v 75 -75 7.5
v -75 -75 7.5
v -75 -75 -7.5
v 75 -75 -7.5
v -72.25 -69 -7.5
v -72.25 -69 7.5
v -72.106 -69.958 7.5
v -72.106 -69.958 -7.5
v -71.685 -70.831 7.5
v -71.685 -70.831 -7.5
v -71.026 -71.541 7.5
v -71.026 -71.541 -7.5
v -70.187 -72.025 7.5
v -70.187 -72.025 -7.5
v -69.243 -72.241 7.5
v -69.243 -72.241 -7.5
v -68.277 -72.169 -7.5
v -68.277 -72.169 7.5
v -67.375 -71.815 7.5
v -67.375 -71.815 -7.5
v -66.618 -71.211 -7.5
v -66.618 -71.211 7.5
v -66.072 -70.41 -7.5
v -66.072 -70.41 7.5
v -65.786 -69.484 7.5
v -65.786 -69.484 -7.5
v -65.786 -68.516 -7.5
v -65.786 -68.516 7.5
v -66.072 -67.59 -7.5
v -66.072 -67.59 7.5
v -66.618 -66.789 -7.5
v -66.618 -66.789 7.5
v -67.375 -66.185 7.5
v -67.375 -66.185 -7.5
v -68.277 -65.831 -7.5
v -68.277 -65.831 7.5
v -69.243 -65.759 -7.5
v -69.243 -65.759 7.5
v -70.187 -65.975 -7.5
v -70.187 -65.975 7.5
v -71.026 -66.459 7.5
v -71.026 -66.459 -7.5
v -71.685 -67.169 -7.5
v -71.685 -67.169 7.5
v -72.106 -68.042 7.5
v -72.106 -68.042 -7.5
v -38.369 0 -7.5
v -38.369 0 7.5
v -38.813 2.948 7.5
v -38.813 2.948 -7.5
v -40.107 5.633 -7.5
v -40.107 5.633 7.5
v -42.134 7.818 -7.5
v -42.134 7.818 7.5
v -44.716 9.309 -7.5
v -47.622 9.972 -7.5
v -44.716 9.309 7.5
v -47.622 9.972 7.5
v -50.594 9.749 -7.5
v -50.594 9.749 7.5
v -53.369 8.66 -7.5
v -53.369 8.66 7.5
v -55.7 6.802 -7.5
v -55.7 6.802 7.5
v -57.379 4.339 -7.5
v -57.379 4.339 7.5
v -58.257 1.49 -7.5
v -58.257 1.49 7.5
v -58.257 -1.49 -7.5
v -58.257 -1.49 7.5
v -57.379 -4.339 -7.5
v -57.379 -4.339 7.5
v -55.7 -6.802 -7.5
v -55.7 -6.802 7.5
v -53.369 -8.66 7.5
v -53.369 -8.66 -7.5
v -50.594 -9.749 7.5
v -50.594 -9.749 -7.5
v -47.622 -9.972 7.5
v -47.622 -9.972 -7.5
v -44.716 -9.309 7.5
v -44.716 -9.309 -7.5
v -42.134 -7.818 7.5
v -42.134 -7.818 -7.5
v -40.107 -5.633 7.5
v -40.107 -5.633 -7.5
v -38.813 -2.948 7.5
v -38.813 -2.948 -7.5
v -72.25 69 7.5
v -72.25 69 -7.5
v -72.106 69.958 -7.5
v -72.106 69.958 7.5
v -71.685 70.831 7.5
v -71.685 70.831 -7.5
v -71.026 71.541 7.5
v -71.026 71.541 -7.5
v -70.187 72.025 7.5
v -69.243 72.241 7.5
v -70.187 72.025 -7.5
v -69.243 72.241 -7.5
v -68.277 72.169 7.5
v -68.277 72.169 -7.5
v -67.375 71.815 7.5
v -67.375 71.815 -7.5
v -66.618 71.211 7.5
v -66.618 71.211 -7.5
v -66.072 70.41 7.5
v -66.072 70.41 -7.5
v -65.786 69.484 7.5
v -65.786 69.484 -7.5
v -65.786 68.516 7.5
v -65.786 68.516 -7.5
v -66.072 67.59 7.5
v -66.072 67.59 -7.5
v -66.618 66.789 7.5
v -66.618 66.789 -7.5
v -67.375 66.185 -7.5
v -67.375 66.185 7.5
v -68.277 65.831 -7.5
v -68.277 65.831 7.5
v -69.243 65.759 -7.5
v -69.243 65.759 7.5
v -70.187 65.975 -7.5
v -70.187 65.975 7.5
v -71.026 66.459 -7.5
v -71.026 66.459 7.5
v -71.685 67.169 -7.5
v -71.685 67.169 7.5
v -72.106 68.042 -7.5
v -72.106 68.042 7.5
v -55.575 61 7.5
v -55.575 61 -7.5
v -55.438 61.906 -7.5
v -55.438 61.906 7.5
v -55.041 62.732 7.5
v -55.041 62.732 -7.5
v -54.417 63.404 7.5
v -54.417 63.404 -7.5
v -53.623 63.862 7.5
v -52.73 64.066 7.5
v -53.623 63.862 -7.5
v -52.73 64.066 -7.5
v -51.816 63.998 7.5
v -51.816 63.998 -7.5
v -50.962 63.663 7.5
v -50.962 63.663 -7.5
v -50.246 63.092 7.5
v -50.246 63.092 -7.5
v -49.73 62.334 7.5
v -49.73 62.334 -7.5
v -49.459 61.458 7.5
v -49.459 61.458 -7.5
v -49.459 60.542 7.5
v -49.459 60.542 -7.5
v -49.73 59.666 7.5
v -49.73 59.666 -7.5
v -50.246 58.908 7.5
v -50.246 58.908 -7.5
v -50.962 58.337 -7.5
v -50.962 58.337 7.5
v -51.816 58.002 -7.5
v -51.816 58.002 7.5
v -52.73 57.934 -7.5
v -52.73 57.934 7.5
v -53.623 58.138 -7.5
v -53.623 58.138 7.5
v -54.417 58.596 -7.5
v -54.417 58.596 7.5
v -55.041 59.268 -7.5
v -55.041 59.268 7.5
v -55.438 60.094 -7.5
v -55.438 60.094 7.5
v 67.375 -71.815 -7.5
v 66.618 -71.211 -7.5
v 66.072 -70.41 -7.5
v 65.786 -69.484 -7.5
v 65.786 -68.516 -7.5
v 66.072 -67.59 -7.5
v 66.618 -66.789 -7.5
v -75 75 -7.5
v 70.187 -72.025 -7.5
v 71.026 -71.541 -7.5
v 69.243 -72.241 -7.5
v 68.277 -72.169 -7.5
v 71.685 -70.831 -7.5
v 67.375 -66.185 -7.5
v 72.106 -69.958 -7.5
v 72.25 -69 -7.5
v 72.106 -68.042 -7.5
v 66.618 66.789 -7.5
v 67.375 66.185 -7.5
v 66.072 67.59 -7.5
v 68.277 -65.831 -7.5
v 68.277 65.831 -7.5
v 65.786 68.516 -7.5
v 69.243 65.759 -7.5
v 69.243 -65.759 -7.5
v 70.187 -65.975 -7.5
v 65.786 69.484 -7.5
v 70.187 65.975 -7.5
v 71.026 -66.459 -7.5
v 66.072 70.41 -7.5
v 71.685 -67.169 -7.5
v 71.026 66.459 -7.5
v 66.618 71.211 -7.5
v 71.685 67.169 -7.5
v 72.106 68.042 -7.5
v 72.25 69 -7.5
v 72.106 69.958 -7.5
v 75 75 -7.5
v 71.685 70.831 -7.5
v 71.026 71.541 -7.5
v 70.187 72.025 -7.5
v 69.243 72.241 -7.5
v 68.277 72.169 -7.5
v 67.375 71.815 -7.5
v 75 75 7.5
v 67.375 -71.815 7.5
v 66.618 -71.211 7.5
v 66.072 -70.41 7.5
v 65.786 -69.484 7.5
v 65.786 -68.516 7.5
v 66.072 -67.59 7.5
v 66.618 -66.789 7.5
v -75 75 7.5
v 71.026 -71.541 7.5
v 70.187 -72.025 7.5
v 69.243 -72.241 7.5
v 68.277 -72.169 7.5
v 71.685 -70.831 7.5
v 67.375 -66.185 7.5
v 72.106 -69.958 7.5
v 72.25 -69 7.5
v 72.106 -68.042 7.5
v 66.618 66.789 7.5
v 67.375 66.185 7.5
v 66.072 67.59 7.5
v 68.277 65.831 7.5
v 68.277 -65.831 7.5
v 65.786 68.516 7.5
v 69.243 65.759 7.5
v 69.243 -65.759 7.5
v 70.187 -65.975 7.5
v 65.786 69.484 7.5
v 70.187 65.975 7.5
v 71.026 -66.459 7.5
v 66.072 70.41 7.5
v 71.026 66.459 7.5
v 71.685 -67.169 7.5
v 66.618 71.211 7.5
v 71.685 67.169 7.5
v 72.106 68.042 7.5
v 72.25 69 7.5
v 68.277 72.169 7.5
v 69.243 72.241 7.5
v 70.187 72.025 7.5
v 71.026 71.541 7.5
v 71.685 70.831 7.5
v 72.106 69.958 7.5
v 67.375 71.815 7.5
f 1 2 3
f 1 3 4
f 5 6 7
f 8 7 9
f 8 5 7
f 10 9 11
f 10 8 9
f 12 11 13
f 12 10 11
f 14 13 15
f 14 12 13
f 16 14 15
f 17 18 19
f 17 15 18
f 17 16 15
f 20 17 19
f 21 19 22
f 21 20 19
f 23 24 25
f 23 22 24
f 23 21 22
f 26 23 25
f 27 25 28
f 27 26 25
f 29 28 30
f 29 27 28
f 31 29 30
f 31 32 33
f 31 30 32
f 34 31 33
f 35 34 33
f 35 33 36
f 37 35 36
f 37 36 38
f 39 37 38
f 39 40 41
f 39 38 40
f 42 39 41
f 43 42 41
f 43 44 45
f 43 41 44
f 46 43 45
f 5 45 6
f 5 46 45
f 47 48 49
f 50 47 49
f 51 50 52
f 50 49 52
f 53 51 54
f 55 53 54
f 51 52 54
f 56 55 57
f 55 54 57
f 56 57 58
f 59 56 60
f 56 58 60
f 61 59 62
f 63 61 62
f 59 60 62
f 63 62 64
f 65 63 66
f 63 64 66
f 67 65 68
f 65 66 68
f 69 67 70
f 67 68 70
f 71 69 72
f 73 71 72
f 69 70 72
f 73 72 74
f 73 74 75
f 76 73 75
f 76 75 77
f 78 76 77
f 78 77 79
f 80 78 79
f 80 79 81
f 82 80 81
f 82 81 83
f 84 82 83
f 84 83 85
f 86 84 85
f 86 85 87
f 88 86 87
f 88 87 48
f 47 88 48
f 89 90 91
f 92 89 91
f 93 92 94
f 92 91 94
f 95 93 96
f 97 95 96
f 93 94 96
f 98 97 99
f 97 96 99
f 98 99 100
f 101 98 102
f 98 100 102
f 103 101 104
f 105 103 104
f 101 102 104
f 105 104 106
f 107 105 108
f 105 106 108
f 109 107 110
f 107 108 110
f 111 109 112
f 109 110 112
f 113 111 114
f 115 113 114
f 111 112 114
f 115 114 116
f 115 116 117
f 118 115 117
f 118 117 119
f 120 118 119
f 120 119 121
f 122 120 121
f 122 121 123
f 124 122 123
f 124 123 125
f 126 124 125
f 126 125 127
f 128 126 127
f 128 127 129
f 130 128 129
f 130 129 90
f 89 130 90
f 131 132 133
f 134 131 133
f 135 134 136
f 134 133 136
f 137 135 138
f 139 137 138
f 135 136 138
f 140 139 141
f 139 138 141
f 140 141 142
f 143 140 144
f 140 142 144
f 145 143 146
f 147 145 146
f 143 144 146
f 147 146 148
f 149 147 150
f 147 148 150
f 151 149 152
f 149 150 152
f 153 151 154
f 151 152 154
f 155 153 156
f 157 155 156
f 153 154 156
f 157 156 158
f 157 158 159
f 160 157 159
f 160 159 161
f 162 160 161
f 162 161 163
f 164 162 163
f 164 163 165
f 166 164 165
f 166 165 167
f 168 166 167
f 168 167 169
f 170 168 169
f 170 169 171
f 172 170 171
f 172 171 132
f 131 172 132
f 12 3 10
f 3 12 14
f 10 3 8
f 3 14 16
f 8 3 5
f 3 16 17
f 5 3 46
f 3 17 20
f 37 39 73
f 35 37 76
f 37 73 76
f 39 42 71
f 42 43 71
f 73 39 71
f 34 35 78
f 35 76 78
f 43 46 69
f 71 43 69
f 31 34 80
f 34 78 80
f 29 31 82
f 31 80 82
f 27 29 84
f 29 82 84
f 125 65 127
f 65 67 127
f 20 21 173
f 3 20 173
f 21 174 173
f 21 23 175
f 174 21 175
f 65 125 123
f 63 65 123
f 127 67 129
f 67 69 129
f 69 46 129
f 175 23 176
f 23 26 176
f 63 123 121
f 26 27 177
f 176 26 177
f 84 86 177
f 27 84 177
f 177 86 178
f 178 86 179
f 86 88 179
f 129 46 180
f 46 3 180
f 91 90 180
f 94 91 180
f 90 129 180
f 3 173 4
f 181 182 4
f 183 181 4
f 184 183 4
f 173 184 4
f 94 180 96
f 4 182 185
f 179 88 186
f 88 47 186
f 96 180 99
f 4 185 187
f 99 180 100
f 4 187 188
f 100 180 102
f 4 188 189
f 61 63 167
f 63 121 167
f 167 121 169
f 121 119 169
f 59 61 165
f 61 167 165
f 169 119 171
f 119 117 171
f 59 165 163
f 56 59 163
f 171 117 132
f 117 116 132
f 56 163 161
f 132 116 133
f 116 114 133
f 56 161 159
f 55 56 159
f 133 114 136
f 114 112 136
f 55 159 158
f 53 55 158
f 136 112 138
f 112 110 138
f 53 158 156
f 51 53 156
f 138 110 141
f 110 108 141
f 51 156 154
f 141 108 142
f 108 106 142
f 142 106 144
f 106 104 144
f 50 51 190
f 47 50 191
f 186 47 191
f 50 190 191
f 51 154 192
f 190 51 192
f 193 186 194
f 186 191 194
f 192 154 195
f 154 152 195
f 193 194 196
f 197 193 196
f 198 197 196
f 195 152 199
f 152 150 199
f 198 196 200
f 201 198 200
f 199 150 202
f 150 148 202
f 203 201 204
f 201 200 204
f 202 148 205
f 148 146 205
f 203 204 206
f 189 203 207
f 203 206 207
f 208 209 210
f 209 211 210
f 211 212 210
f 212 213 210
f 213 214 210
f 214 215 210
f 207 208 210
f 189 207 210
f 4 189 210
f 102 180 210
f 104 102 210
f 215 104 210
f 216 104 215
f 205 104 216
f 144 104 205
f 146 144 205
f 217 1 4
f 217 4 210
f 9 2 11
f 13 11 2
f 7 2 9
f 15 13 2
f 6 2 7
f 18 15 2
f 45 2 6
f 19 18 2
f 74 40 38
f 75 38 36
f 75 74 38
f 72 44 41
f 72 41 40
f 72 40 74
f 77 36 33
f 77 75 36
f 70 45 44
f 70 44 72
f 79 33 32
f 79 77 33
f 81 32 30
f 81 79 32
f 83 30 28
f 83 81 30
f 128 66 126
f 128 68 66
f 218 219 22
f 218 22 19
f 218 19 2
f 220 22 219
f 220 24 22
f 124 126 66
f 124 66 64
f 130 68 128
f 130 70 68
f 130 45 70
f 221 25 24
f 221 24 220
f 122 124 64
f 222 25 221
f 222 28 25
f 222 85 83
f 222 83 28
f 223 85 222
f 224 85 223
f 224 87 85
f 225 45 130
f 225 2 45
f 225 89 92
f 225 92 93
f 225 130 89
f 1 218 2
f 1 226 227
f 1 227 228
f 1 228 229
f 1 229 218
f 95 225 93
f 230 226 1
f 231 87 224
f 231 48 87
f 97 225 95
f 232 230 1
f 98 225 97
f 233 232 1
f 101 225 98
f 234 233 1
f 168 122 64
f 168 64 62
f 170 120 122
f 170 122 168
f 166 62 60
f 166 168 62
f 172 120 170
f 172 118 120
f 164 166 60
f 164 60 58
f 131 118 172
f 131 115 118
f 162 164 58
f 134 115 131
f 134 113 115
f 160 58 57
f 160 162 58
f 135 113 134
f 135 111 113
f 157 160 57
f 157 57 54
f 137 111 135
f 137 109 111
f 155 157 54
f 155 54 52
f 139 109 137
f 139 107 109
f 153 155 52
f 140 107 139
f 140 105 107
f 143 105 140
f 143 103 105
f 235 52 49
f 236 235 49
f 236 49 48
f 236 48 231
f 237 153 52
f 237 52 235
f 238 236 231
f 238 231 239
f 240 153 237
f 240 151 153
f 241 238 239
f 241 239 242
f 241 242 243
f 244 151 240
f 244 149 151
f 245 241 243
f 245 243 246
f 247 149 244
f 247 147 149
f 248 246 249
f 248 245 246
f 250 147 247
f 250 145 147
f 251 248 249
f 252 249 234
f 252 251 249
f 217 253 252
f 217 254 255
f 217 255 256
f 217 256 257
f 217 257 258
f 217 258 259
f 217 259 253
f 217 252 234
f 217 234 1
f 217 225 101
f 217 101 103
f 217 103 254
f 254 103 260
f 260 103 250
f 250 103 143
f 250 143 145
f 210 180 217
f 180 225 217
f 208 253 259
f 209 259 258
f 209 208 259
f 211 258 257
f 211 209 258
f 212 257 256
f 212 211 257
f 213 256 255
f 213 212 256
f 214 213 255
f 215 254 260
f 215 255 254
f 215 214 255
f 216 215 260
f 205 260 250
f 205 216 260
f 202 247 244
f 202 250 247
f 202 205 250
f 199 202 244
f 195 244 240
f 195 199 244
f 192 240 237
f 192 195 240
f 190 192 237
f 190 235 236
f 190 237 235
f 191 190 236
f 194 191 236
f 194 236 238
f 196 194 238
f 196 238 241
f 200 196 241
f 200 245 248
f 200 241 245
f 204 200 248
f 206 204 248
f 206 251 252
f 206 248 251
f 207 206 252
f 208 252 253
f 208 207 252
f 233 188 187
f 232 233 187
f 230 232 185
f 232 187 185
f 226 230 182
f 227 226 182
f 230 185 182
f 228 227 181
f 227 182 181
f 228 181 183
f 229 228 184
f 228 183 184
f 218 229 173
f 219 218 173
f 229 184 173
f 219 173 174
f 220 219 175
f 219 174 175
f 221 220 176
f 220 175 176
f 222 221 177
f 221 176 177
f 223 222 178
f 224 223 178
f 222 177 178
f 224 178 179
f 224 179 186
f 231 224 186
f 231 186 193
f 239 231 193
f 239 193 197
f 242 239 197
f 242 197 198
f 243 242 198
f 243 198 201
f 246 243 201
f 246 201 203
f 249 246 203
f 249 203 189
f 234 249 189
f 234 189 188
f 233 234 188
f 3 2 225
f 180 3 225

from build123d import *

# Parameters (mm, degrees)
SKETCH1_W               = 150
SKETCH1_H               = 150
BOSS_EXTRUDE1_DEPTH     = 7.5
SKETCH2_R               = 3.075
CUT_EXTRUDE2_DEPTH      = 32
SKETCH5_R               = 10
CUT_EXTRUDE5_DEPTH      = 22
SKETCH6_R               = 3.25
CUT_EXTRUDE6_DEPTH      = 22
MIRROR2_COPY_1_SKETCH_R = 3.25
MIRROR2_COPY_1_DEPTH    = 22


with BuildPart() as part:
    # Sketch1 → Boss-Extrude1 (new, symmetric)
    with BuildSketch(Plane.XY):
        Rectangle(SKETCH1_W, SKETCH1_H)
    extrude(amount=BOSS_EXTRUDE1_DEPTH, both=True)

    # Sketch2 → Cut-Extrude2 (cut)
    with BuildSketch(Plane(origin=(0, 0, -7.5), x_dir=(-1, 0, 0), z_dir=(0, 0, -1))):
        with Locations((52.5, 61)):
            Circle(SKETCH2_R)
    extrude(amount=-CUT_EXTRUDE2_DEPTH, mode=Mode.SUBTRACT)

    # Sketch5 → Cut-Extrude5 (cut)
    with BuildSketch(Plane.XY.offset(7.5)):
        with Locations((-48.369109736, 0)):
            Circle(SKETCH5_R)
    extrude(amount=-CUT_EXTRUDE5_DEPTH, mode=Mode.SUBTRACT)

    # Sketch6 → Cut-Extrude6 (cut)
    with BuildSketch(Plane(origin=(0, 0, -7.5), x_dir=(-1, 0, 0), z_dir=(0, 0, -1))):
        with Locations((69, 69)):
            Circle(SKETCH6_R)
    cut_extrude6 = extrude(amount=-CUT_EXTRUDE6_DEPTH, mode=Mode.SUBTRACT)

    # Mirror1: Cut-Extrude6 across plane
    add(cut_extrude6.mirror(Plane.ZX), mode=Mode.SUBTRACT)

    # Mirror2: Cut-Extrude6 across plane
    add(cut_extrude6.mirror(Plane(origin=(0, 0, 0), x_dir=(0, 0, 1), z_dir=(1, 0, 0))), mode=Mode.SUBTRACT)

    # Mirror2 copy 1 sketch → Mirror2 copy 1 (cut)
    with BuildSketch(Plane(origin=(0, 0, -7.5), x_dir=(1, 0, 0), z_dir=(0, 0, -1))):
        with Locations((69, 69)):
            Circle(MIRROR2_COPY_1_SKETCH_R)
    extrude(amount=-MIRROR2_COPY_1_DEPTH, mode=Mode.SUBTRACT)


solid = part.part
